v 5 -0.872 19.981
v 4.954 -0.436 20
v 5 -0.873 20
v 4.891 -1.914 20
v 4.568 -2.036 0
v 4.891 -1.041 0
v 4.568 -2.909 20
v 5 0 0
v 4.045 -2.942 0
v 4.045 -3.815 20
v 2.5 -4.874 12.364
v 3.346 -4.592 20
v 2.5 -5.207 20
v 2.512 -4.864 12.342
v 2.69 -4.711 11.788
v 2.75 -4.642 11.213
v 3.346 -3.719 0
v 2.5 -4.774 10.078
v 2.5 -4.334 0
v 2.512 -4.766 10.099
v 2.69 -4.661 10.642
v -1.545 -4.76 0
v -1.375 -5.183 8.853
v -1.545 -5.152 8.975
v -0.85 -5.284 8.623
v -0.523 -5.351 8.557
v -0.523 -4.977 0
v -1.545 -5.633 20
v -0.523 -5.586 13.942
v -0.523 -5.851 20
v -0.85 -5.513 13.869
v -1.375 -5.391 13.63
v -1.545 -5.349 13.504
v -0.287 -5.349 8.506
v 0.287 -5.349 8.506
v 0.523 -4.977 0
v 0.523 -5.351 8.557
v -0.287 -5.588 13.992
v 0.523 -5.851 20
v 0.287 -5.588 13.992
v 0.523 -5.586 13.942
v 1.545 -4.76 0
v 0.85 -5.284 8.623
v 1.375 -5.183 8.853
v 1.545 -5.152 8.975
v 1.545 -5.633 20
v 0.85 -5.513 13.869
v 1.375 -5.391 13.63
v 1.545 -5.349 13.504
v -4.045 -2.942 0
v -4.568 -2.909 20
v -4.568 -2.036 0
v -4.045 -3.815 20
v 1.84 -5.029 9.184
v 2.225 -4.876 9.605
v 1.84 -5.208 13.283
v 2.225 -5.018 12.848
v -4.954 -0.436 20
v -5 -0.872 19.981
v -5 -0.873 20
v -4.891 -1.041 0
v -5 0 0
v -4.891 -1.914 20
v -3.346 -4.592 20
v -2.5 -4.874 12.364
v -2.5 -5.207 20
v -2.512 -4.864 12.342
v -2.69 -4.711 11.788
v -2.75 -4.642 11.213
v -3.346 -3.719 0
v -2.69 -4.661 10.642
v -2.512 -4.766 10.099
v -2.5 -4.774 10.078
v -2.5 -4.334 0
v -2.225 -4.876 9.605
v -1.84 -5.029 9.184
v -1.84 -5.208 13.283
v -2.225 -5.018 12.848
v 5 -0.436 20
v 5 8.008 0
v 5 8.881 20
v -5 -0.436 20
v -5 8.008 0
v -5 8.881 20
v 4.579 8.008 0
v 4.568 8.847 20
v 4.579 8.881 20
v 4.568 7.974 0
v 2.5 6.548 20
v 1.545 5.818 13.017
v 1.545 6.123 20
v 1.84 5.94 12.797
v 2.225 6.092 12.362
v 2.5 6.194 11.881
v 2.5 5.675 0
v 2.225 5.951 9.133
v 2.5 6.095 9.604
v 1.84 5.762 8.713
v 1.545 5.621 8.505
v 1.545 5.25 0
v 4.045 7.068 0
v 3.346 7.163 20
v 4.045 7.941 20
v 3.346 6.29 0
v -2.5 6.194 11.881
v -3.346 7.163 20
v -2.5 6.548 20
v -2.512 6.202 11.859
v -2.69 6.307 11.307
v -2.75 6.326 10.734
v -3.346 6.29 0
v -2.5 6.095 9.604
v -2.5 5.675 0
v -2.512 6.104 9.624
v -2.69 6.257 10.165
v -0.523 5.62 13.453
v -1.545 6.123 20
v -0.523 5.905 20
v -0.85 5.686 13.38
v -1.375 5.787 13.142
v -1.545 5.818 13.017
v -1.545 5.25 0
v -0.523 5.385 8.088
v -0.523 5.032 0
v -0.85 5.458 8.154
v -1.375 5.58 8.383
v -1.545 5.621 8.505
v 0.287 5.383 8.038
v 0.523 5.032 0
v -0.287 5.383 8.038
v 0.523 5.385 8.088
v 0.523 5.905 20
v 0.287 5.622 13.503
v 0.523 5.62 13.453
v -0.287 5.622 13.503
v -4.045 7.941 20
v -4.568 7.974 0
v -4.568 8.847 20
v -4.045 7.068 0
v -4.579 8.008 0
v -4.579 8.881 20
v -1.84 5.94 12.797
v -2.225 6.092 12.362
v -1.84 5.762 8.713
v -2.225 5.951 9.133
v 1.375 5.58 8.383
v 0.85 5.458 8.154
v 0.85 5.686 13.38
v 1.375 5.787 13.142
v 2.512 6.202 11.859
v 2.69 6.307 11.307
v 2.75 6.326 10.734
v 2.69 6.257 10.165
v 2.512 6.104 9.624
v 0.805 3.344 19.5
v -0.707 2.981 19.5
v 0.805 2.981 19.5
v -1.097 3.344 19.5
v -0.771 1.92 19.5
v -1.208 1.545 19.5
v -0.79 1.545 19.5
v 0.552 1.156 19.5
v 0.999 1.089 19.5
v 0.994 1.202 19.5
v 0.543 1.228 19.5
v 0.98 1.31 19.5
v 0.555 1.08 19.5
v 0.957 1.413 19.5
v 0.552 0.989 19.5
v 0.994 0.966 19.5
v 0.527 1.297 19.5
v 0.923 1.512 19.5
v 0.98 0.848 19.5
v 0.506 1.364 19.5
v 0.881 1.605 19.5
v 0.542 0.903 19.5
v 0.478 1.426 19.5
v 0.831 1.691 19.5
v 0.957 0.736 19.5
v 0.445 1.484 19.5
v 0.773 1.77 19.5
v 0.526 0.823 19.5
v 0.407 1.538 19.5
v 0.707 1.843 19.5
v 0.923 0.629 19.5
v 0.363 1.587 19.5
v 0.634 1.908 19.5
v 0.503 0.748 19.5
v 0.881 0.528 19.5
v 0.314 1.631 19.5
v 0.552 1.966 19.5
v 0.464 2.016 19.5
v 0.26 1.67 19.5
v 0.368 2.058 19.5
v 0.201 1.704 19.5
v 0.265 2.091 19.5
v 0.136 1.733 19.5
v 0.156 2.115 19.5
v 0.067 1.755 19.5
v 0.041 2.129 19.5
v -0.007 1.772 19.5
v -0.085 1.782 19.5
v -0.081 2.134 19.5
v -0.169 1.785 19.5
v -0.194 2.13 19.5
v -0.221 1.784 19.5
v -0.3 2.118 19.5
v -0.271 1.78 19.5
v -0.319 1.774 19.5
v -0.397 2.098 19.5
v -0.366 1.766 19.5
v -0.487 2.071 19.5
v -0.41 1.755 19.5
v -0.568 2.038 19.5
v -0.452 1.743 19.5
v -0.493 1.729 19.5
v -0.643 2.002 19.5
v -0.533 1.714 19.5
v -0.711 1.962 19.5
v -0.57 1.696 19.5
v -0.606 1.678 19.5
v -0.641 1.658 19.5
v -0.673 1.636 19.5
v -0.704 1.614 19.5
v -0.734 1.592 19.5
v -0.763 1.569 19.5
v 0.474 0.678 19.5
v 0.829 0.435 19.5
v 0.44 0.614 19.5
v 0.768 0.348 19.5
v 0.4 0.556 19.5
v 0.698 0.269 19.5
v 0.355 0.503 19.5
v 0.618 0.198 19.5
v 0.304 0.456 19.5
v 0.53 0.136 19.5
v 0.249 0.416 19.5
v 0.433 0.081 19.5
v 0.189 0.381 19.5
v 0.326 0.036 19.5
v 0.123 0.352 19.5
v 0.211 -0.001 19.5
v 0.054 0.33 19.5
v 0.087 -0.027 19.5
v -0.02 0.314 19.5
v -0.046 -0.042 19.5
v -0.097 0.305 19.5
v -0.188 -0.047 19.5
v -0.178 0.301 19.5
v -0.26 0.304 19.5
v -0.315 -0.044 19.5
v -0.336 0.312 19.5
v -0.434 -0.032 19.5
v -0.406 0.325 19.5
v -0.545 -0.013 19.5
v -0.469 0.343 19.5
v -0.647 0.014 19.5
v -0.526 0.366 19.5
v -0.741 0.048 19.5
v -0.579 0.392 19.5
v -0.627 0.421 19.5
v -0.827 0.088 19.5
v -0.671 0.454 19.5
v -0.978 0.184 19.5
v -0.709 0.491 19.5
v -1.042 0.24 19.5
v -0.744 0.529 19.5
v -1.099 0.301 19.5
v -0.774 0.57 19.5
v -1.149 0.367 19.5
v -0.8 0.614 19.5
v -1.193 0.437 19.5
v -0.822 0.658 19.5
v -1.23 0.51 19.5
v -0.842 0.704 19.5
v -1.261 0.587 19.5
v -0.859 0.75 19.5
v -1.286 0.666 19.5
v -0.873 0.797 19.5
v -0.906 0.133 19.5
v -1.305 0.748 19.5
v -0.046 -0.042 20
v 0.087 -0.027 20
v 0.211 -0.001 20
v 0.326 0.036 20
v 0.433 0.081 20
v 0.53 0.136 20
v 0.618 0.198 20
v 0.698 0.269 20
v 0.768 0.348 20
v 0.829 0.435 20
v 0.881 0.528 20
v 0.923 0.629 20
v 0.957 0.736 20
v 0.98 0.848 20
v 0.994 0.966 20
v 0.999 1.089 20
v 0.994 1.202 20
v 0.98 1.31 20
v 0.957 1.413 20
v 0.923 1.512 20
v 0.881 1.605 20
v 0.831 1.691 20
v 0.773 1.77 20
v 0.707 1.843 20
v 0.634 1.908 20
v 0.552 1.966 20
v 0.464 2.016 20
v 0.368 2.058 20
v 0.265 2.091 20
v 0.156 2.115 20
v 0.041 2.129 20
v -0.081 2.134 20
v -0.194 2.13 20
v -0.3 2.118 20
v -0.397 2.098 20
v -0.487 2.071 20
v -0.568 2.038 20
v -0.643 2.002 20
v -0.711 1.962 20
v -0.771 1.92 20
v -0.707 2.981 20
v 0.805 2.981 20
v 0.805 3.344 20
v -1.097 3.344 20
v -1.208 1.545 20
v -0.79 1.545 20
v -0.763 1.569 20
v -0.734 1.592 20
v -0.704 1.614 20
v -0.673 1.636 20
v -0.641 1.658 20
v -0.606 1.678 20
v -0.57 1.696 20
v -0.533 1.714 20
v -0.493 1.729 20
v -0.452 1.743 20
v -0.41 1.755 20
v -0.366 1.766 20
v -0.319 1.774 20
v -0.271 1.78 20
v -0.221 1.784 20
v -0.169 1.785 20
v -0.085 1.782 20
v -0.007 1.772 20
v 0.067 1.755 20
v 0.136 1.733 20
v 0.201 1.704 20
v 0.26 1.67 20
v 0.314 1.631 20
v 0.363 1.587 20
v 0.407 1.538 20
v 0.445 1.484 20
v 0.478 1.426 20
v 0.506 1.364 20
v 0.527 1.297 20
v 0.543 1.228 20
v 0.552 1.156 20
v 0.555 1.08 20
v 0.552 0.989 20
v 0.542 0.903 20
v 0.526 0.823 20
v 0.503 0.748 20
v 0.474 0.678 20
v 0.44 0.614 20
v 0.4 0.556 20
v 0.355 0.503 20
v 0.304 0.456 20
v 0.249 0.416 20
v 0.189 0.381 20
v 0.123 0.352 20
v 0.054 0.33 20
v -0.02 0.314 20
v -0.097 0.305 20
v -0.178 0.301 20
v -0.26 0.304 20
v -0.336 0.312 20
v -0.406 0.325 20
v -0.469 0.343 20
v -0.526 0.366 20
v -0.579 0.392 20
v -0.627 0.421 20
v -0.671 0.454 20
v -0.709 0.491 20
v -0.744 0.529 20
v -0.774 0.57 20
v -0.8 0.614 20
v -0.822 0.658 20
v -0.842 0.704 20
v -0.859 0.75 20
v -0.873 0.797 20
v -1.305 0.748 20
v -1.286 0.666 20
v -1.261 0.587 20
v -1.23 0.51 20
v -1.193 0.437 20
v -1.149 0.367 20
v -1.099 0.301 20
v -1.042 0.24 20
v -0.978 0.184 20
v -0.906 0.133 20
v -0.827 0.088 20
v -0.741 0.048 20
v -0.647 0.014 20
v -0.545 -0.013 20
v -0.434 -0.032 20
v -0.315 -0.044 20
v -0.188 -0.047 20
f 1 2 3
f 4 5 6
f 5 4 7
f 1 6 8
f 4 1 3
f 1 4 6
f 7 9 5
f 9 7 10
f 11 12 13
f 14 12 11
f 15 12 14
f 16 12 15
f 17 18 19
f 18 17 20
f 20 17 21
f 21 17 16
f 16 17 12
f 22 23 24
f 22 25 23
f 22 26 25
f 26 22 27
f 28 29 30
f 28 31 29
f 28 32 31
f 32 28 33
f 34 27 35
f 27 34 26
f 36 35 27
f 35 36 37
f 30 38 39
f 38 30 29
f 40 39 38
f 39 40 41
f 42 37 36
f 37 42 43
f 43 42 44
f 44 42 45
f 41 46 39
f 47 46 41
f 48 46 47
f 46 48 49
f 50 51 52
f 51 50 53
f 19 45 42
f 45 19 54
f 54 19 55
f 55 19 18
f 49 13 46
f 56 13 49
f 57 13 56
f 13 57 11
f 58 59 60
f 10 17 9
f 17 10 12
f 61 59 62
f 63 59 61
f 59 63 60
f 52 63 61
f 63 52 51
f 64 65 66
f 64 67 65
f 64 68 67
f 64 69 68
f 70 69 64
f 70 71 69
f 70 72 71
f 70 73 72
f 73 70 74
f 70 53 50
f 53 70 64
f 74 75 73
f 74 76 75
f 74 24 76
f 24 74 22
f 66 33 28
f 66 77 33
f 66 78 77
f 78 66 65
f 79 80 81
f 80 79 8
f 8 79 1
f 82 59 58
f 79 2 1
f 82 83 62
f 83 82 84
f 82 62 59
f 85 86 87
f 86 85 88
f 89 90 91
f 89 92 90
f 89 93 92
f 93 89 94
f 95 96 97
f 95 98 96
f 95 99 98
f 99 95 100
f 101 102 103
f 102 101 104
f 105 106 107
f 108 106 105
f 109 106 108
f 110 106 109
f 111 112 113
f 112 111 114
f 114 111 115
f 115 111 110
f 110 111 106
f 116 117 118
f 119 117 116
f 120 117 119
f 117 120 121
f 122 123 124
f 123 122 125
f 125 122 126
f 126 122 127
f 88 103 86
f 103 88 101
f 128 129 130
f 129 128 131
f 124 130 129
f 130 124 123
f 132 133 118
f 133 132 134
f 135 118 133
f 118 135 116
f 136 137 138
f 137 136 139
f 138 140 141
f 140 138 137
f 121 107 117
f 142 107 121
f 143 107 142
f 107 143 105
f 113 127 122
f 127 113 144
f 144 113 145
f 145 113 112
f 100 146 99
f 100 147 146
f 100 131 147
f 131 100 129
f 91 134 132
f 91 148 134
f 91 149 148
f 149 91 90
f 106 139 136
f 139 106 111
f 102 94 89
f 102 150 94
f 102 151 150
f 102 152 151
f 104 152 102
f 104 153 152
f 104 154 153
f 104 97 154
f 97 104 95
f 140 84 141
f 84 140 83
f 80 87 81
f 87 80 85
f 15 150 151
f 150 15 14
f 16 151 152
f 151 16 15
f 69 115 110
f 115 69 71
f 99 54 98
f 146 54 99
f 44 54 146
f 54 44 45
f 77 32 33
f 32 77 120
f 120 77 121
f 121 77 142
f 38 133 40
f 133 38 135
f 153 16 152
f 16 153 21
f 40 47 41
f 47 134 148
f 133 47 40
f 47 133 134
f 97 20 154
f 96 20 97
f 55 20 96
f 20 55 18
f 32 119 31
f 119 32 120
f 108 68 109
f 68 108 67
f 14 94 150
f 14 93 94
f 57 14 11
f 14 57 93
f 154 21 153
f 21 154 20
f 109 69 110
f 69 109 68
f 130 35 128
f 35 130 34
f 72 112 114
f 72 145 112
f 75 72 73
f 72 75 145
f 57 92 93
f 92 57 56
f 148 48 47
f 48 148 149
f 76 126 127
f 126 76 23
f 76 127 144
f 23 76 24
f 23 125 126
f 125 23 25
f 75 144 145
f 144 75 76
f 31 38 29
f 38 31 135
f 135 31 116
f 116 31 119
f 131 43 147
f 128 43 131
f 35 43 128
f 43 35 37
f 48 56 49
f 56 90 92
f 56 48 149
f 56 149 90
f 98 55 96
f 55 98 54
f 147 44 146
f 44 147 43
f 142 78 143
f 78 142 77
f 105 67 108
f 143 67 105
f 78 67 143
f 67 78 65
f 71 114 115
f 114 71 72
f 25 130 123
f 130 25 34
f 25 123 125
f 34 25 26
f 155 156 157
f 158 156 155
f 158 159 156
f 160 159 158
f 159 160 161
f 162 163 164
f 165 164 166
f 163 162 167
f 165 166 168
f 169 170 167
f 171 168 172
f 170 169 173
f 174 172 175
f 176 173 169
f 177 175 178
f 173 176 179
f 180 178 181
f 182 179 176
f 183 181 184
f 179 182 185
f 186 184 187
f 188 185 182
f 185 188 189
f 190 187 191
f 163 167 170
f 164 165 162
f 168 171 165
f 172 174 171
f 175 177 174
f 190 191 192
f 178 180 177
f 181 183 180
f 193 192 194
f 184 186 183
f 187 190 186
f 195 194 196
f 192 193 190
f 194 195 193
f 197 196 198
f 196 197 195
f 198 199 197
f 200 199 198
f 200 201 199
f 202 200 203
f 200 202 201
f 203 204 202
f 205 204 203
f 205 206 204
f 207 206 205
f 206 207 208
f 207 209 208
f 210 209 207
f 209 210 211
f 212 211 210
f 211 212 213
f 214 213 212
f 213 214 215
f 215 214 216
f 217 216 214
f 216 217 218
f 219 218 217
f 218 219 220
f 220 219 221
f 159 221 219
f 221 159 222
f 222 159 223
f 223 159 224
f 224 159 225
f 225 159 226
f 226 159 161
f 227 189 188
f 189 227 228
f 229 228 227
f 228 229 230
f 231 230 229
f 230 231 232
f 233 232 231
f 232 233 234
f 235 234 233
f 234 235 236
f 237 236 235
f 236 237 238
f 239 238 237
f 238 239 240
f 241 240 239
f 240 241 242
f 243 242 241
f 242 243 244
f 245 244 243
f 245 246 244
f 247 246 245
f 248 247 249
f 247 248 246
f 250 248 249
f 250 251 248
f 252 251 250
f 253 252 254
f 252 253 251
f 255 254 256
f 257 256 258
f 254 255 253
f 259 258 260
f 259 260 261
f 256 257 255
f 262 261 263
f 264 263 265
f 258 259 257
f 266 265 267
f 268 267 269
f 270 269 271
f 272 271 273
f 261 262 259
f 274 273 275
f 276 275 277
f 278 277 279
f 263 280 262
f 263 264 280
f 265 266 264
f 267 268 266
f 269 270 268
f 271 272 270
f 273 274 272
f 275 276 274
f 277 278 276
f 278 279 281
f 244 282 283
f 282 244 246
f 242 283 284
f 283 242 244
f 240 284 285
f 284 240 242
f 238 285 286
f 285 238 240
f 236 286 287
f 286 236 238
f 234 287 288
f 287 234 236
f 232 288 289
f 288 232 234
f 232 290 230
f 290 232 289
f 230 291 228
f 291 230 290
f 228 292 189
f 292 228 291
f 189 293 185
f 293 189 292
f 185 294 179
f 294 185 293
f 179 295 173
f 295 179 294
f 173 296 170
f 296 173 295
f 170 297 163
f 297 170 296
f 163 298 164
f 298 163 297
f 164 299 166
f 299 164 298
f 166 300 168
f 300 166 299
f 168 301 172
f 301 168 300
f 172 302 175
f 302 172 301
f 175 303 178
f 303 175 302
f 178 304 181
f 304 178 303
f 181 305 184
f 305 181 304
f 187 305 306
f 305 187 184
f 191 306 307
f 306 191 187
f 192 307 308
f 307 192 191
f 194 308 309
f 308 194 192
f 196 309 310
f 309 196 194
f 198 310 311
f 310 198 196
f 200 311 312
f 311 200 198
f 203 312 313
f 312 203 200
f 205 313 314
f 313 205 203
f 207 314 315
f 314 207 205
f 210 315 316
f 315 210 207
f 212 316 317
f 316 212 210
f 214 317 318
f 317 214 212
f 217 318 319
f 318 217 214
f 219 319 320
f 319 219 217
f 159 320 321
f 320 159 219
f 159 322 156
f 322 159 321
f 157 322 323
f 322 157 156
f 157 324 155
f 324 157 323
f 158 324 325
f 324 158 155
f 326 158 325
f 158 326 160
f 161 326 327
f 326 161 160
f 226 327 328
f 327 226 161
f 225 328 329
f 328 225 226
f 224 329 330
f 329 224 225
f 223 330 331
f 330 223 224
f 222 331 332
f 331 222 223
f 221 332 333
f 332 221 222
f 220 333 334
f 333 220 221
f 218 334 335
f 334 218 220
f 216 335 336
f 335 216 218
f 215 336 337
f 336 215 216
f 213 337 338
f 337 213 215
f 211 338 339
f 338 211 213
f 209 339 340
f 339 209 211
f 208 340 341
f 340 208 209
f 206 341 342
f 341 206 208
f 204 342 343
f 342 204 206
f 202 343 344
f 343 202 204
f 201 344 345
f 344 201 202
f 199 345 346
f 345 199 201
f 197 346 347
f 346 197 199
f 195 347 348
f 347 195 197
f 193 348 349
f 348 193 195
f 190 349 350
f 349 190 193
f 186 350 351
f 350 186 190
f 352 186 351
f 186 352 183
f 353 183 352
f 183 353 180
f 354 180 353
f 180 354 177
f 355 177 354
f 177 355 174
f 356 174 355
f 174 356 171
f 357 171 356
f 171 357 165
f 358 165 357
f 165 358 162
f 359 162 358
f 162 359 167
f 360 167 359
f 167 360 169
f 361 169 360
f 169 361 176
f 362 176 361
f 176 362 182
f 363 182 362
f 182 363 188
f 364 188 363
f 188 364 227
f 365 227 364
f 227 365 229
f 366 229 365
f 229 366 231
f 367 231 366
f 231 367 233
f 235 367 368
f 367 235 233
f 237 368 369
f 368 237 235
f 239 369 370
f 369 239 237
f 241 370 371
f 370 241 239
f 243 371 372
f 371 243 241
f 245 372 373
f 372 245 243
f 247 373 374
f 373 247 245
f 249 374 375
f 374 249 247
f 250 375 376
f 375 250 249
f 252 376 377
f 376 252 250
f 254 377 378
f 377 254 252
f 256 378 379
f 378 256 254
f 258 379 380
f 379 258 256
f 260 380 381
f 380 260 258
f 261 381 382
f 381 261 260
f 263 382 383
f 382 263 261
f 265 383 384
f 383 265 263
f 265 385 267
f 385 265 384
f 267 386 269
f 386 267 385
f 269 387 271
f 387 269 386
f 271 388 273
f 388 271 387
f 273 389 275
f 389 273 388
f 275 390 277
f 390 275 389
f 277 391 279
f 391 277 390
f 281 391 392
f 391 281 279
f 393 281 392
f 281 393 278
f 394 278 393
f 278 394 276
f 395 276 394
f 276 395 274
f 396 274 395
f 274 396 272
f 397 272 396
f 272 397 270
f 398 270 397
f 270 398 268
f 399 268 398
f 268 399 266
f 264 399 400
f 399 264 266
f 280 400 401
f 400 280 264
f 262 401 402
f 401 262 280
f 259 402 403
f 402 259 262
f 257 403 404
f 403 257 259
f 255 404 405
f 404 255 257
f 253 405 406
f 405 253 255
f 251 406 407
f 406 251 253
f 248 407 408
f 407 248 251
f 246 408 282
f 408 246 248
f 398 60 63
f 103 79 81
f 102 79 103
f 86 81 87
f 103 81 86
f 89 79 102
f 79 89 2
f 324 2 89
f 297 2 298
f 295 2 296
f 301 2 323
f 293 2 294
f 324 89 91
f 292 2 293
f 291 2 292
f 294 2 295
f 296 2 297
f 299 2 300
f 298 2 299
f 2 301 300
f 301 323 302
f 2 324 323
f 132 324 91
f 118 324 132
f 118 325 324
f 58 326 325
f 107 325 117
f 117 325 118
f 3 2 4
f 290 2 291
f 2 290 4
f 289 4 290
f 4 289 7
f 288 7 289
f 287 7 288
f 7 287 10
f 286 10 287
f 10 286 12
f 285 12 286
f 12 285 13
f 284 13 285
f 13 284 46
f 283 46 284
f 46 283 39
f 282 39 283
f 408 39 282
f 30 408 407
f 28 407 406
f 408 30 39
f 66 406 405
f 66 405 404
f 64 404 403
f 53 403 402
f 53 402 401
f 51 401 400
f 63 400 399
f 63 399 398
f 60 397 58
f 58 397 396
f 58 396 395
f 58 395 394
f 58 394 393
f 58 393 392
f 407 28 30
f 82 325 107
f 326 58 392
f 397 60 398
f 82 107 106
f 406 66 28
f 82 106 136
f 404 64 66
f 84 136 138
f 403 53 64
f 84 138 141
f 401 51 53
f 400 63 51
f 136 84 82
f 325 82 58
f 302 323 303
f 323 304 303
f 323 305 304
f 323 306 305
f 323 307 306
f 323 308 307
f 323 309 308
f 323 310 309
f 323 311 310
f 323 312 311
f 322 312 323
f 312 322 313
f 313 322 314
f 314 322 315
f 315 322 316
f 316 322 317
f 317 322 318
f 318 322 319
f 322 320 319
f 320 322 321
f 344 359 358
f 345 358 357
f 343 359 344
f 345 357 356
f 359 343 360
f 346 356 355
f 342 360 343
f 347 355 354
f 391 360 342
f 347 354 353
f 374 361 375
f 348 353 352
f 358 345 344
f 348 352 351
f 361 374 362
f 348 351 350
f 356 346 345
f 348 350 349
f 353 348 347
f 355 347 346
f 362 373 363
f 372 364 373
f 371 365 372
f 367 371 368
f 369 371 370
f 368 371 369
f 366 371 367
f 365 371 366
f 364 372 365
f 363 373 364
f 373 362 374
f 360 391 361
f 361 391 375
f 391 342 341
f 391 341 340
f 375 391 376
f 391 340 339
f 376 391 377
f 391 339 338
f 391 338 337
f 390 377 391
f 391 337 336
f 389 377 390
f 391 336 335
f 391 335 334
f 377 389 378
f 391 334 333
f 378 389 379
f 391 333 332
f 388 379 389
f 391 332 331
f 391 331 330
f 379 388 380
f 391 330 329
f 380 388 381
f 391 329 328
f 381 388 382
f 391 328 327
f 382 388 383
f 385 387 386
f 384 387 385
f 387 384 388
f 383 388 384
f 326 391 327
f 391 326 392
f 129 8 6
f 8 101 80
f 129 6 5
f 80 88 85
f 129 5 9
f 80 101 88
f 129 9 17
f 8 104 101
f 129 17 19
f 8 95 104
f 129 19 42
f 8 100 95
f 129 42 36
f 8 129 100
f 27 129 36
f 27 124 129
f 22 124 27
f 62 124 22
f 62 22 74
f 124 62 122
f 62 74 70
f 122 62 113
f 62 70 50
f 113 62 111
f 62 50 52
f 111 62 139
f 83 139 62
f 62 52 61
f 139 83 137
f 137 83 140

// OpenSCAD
// Angle betwen the two opposing curved faces of the spacer.
angle = 5; // [0:8]
// Bolt diameter (mm)
bolt_diameter = 5; // [4,5,6]
// Whether to mark the top face with the value of the angle. Makes it easier to tell various versions apart after printing.
render_angle_mark = 1; // [1:true,0:false]
$fn = 30;

spacer(angle, bolt_diameter, render_angle_mark);

module spacer(angle, bolt_diameter=5, render_text=true) {
    // Do not expose these as the design is not (yet) ready for different values.
    height = 20;
    thickness = 10;
    mount_diameter = 10;

    // Rotate the whole spacer half the angle to align the base with XY plane.
    rotate([angle / 2, 0, 0]) {
        difference(){
            union() {
                cylinder(d=mount_diameter, h=height + 1);
                translate([-5, 0, -1]) {
                    cube(size=[mount_diameter, thickness + 1, height + 1]);
                }
            }
            rotate([-angle, 0, 0]) {
                translate([0, thickness, -2.5]) {
                    cylinder(d=mount_diameter, h=height + 5);
                }
                translate([-6, thickness - 2, -1]) {
                    cube(size=[mount_diameter + 2, 10, height + 2]);
                }
                // Move the hole slightly higher to give bigger support for the shifter.
                // Shifters usually have the hole moved slightly upwards.
                translate([0, 0,  height / 2 + 1]) {
                    // Make the hole perpendicular to the shifter support.
                    // The bolt angle is meant to be evened out by conical washers under the bolt head.
                    rotate([90, 0, 0]) {
                        cylinder(d=bolt_diameter + 0.5, h=thickness + 10, center=true);
                    }
                }
            }
            // Rotate top and bottom constrains for half the angle
            // to make oposing corners symetric.
            rotate([-angle / 2, 0, 0]) {
                if (render_text) {
                    translate([-1.5, 0, height - 0.5]) {
                        linear_extrude(1){
                            text(str(angle), 3.5);
                        }
                    }
                }
                translate([-(mount_diameter + 2) / 2, -(thickness + 8) / 2, height]) {
                    cube(size=[mount_diameter + 2, thickness + 10, 5]);
                }
                translate([-(mount_diameter + 2) / 2, -(thickness + 8) / 2, -5]) {
                    cube(size=[mount_diameter + 2, thickness + 10, 5]);
                }
            }
        }
    }
}
